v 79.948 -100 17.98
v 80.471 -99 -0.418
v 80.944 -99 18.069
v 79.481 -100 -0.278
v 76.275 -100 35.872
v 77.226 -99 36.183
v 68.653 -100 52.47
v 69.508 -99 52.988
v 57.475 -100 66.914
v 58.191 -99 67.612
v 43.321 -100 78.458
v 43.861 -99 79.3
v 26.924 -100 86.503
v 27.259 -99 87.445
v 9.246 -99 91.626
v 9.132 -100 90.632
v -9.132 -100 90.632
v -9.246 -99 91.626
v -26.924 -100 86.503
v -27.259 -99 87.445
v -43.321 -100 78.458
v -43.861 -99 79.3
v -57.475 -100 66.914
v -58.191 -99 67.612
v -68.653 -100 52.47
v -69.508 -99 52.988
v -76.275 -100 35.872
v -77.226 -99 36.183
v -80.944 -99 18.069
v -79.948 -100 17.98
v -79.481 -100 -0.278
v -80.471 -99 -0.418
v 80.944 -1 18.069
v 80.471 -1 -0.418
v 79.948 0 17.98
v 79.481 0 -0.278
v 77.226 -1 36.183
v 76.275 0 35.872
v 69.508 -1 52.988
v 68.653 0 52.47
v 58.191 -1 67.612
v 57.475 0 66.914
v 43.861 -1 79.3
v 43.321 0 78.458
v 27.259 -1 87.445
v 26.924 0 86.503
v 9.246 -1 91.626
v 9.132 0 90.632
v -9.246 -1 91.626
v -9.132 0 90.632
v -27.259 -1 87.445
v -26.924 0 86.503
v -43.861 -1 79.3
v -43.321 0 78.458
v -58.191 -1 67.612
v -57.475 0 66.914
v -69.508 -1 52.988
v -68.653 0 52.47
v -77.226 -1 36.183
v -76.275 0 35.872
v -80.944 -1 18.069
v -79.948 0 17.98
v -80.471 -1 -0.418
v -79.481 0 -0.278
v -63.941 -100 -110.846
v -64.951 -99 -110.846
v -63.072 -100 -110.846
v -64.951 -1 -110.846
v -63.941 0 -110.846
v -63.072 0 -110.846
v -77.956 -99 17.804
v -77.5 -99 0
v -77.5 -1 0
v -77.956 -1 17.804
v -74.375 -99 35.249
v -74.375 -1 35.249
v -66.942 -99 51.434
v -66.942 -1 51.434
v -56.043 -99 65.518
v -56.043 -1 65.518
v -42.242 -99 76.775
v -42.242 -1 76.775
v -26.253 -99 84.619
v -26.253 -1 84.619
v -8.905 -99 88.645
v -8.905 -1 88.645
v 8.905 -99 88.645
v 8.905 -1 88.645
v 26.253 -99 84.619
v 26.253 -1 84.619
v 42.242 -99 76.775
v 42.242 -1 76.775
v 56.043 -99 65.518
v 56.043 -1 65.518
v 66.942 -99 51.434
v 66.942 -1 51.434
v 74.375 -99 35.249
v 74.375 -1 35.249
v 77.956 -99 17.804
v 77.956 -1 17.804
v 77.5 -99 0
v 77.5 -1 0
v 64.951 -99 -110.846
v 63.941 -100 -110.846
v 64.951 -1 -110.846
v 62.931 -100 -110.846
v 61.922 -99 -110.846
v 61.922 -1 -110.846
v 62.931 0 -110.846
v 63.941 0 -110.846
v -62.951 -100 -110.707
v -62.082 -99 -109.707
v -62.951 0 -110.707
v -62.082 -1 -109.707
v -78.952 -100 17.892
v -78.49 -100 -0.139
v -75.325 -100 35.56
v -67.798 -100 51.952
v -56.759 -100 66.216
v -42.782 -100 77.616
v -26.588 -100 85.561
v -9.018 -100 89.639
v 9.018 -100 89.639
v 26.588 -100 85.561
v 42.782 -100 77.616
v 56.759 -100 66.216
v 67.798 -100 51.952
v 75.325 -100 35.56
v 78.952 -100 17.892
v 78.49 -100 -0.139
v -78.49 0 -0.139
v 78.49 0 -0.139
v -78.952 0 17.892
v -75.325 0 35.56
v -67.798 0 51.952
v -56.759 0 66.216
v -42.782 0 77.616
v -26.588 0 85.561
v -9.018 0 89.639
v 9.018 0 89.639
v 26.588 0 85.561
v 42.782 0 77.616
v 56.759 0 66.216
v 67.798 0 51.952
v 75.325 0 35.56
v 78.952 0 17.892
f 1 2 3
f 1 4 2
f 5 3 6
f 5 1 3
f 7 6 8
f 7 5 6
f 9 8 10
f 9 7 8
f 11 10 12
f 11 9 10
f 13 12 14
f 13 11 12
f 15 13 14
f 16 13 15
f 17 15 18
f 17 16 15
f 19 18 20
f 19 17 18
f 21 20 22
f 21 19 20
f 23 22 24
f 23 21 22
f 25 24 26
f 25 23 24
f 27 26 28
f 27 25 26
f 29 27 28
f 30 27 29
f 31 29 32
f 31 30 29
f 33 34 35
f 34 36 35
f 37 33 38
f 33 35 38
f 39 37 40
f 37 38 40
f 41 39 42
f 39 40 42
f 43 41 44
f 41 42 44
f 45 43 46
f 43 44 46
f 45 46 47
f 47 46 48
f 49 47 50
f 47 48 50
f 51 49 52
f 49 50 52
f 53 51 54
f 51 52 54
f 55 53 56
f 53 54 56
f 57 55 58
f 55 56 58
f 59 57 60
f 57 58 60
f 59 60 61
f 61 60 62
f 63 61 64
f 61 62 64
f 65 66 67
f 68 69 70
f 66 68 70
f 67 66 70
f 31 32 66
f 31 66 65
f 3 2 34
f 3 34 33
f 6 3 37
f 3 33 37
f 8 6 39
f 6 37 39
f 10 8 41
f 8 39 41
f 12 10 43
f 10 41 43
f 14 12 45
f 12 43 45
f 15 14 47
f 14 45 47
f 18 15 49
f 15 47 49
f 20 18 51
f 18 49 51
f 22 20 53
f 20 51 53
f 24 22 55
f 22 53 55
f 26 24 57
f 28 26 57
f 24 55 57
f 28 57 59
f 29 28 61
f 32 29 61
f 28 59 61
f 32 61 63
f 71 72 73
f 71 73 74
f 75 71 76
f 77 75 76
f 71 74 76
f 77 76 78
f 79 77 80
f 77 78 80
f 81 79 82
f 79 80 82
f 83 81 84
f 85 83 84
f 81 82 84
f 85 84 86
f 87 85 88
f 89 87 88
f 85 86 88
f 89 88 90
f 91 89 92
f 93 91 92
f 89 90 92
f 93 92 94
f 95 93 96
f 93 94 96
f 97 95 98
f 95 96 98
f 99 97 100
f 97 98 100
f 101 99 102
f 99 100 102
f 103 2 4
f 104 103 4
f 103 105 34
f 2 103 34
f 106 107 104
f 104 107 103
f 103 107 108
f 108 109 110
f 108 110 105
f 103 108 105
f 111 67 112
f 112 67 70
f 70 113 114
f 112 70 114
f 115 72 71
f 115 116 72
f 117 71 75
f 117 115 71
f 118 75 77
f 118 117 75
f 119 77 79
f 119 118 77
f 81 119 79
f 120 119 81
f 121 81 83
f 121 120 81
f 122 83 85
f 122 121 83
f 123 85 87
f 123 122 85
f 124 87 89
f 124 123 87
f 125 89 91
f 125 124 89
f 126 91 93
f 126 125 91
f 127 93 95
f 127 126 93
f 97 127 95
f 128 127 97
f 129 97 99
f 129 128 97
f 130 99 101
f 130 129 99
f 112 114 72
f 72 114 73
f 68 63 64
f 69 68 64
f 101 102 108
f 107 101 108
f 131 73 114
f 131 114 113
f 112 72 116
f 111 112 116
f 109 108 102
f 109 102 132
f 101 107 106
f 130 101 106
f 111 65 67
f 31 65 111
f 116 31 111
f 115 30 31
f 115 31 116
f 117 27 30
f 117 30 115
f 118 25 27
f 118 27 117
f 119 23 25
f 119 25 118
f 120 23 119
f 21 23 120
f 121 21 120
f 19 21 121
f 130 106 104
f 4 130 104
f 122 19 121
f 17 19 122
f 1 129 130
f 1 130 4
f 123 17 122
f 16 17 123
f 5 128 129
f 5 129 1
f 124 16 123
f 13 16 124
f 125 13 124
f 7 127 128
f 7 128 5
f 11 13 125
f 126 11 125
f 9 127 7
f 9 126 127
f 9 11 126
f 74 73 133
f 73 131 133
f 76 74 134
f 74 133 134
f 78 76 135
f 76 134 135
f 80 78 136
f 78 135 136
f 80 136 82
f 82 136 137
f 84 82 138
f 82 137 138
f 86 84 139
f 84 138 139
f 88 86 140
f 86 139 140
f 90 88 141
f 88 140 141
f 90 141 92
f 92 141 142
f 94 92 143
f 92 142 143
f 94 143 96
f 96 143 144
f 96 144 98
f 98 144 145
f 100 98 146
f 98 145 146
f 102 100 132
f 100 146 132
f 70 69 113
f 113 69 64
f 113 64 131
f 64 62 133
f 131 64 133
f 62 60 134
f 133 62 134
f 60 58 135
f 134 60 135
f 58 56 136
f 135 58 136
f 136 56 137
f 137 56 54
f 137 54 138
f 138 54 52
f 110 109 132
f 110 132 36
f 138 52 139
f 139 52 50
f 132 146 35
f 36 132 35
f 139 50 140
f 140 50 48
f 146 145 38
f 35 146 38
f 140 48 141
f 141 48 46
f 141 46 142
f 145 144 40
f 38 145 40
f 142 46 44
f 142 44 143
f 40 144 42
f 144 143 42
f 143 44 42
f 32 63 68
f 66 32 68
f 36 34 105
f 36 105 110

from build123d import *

# Parameters (mm, degrees)
F1_DEPTH     = 100
F2_T1_DEPTH  = 105.8849898869
F2_T3_DEPTH  = 114.5074829388
F2_T5_DEPTH  = 114.0858604347
F2_T7_DEPTH  = 114.5074829388
F2_T9_DEPTH  = 114.0858604347
F2_T12_ANGLE = 196
F2_T14_ANGLE = 196
F2_T16_ANGLE = 196
F2_T18_ANGLE = 196


# Not quite as in the source:
# - a fillet or chamfer that OpenCascade refuses, or shapes differently, is made with other operations: its cross-section is extruded or revolved along the edge and cut away or added


with BuildPart() as f1:
    # F0 (on Front) → F1 (new body)
    with BuildSketch(Plane.XZ):
        with BuildLine():
            Line((-61.9215476124, -110.8464484404), (-77.5, 0))
            ThreePointArc((-77.5, 0), (0, 89.1535515596), (77.5, 0))
            Line((77.5, 0), (61.9215476124, -110.8464484404))
            Line((61.9215476124, -110.8464484404), (64.95103033, -110.8464484404))
            Line((64.95103033, -110.8464484404), (80.4708042062, -0.4175193029))
            ThreePointArc((80.4708042062, -0.4175193029), (0, 92.1535515596), (-80.4708042062, -0.4175193029))
            Line((-80.4708042062, -0.4175193029), (-64.95103033, -110.8464484404))
            Line((-64.95103033, -110.8464484404), (-61.9215476124, -110.8464484404))
        make_face()
    extrude(amount=F1_DEPTH)

    # F2: chamfer of 1 on 17 edges, made by hand

    # F2_s2 → F2_t1 (cut)
    with BuildSketch(Plane.XZ.offset(-2.9424949434)):
        Polygon((-63.0719160196, -110.8464484404), (-62.0816479509, -109.7072753394), (-61.9215476124, -110.8464484404), align=None)
    extrude(amount=F2_T1_DEPTH, mode=Mode.SUBTRACT)

    # F2_s4 → F2_t3 (cut)
    with BuildSketch(Plane(origin=(14.4352522013, 0, -102.7121564484), x_dir=(0, 1, 0), z_dir=(-0.139173101, 0, 0.9902680687))):
        Polygon((-1, 76.7457753275), (0, 77.7457753275), (0, 76.7457753275), align=None)
        Polygon((-99, 76.7457753275), (-100, 77.7457753275), (-100, 76.7457753275), align=None)
    extrude(amount=F2_T3_DEPTH, mode=Mode.SUBTRACT)

    # F2_s6 → F2_t5 (cut)
    with BuildSketch(Plane(origin=(-1.5011092824, 0, 10.6809475379), x_dir=(0, 1, 0), z_dir=(0.139173101, 0, -0.9902680687))):
        Polygon((-1, -79.7457753275), (0, -78.7457753275), (0, -79.7457753275), align=None)
        Polygon((-99, -79.7457753275), (-100, -78.7457753275), (-100, -79.7457753275), align=None)
    extrude(amount=F2_T5_DEPTH, mode=Mode.SUBTRACT)

    # F2_s8 → F2_t7 (cut)
    with BuildSketch(Plane(origin=(1.5011092824, 0, 10.6809475379), x_dir=(0, 1, 0), z_dir=(-0.139173101, 0, -0.9902680687))):
        Polygon((-1, 76.7457753275), (0, 77.7457753275), (0, 76.7457753275), align=None)
        Polygon((-99, 76.7457753275), (-100, 77.7457753275), (-100, 76.7457753275), align=None)
    extrude(amount=F2_T7_DEPTH, mode=Mode.SUBTRACT)

    # F2_s10 → F2_t9 (cut)
    with BuildSketch(Plane(origin=(-14.37657369, 0, -102.2946371455), x_dir=(0, 1, 0), z_dir=(0.139173101, 0, 0.9902680687))):
        Polygon((-1, -79.7457753275), (0, -78.7457753275), (0, -79.7457753275), align=None)
        Polygon((-99, -79.7457753275), (-100, -78.7457753275), (-100, -79.7457753275), align=None)
    extrude(amount=F2_T9_DEPTH, mode=Mode.SUBTRACT)

    # F2_s11 → F2_t12 (revolve, cut)
    with BuildSketch(Plane(origin=(1.5011092824, 0, 10.6809475379), x_dir=(0, 1, 0), z_dir=(-0.139173101, 0, -0.9902680687))):
        Polygon((-1, 79.7457753275), (0, 78.7457753275), (0, 79.7457753275), align=None)
    revolve(axis=Axis((0, 0, 10.8919146894), (0, -1, 0)), revolution_arc=F2_T12_ANGLE, mode=Mode.SUBTRACT)

    # F2_s13 → F2_t14 (revolve, cut)
    with BuildSketch(Plane(origin=(1.5011092824, 0, 10.6809475379), x_dir=(0, 1, 0), z_dir=(-0.139173101, 0, -0.9902680687))):
        Polygon((-99, 79.7457753275), (-100, 78.7457753275), (-100, 79.7457753275), align=None)
    revolve(axis=Axis((0, -100, 10.8919146894), (0, -1, 0)), revolution_arc=F2_T14_ANGLE, mode=Mode.SUBTRACT)

    # F2_s15 → F2_t16 (revolve, cut)
    with BuildSketch(Plane(origin=(-1.5011092824, 0, 10.6809475379), x_dir=(0, 1, 0), z_dir=(0.139173101, 0, -0.9902680687))):
        Polygon((-1, -76.7457753275), (0, -77.7457753275), (0, -76.7457753275), align=None)
    revolve(axis=Axis((0, 0, 10.8919146894), (0, 1, 0)), revolution_arc=F2_T16_ANGLE, mode=Mode.SUBTRACT)

    # F2_s17 → F2_t18 (revolve, cut)
    with BuildSketch(Plane(origin=(-1.5011092824, 0, 10.6809475379), x_dir=(0, 1, 0), z_dir=(0.139173101, 0, -0.9902680687))):
        Polygon((-99, -76.7457753275), (-100, -77.7457753275), (-100, -76.7457753275), align=None)
    revolve(axis=Axis((0, -100, 10.8919146894), (0, 1, 0)), revolution_arc=F2_T18_ANGLE, mode=Mode.SUBTRACT)


solid = f1.part
